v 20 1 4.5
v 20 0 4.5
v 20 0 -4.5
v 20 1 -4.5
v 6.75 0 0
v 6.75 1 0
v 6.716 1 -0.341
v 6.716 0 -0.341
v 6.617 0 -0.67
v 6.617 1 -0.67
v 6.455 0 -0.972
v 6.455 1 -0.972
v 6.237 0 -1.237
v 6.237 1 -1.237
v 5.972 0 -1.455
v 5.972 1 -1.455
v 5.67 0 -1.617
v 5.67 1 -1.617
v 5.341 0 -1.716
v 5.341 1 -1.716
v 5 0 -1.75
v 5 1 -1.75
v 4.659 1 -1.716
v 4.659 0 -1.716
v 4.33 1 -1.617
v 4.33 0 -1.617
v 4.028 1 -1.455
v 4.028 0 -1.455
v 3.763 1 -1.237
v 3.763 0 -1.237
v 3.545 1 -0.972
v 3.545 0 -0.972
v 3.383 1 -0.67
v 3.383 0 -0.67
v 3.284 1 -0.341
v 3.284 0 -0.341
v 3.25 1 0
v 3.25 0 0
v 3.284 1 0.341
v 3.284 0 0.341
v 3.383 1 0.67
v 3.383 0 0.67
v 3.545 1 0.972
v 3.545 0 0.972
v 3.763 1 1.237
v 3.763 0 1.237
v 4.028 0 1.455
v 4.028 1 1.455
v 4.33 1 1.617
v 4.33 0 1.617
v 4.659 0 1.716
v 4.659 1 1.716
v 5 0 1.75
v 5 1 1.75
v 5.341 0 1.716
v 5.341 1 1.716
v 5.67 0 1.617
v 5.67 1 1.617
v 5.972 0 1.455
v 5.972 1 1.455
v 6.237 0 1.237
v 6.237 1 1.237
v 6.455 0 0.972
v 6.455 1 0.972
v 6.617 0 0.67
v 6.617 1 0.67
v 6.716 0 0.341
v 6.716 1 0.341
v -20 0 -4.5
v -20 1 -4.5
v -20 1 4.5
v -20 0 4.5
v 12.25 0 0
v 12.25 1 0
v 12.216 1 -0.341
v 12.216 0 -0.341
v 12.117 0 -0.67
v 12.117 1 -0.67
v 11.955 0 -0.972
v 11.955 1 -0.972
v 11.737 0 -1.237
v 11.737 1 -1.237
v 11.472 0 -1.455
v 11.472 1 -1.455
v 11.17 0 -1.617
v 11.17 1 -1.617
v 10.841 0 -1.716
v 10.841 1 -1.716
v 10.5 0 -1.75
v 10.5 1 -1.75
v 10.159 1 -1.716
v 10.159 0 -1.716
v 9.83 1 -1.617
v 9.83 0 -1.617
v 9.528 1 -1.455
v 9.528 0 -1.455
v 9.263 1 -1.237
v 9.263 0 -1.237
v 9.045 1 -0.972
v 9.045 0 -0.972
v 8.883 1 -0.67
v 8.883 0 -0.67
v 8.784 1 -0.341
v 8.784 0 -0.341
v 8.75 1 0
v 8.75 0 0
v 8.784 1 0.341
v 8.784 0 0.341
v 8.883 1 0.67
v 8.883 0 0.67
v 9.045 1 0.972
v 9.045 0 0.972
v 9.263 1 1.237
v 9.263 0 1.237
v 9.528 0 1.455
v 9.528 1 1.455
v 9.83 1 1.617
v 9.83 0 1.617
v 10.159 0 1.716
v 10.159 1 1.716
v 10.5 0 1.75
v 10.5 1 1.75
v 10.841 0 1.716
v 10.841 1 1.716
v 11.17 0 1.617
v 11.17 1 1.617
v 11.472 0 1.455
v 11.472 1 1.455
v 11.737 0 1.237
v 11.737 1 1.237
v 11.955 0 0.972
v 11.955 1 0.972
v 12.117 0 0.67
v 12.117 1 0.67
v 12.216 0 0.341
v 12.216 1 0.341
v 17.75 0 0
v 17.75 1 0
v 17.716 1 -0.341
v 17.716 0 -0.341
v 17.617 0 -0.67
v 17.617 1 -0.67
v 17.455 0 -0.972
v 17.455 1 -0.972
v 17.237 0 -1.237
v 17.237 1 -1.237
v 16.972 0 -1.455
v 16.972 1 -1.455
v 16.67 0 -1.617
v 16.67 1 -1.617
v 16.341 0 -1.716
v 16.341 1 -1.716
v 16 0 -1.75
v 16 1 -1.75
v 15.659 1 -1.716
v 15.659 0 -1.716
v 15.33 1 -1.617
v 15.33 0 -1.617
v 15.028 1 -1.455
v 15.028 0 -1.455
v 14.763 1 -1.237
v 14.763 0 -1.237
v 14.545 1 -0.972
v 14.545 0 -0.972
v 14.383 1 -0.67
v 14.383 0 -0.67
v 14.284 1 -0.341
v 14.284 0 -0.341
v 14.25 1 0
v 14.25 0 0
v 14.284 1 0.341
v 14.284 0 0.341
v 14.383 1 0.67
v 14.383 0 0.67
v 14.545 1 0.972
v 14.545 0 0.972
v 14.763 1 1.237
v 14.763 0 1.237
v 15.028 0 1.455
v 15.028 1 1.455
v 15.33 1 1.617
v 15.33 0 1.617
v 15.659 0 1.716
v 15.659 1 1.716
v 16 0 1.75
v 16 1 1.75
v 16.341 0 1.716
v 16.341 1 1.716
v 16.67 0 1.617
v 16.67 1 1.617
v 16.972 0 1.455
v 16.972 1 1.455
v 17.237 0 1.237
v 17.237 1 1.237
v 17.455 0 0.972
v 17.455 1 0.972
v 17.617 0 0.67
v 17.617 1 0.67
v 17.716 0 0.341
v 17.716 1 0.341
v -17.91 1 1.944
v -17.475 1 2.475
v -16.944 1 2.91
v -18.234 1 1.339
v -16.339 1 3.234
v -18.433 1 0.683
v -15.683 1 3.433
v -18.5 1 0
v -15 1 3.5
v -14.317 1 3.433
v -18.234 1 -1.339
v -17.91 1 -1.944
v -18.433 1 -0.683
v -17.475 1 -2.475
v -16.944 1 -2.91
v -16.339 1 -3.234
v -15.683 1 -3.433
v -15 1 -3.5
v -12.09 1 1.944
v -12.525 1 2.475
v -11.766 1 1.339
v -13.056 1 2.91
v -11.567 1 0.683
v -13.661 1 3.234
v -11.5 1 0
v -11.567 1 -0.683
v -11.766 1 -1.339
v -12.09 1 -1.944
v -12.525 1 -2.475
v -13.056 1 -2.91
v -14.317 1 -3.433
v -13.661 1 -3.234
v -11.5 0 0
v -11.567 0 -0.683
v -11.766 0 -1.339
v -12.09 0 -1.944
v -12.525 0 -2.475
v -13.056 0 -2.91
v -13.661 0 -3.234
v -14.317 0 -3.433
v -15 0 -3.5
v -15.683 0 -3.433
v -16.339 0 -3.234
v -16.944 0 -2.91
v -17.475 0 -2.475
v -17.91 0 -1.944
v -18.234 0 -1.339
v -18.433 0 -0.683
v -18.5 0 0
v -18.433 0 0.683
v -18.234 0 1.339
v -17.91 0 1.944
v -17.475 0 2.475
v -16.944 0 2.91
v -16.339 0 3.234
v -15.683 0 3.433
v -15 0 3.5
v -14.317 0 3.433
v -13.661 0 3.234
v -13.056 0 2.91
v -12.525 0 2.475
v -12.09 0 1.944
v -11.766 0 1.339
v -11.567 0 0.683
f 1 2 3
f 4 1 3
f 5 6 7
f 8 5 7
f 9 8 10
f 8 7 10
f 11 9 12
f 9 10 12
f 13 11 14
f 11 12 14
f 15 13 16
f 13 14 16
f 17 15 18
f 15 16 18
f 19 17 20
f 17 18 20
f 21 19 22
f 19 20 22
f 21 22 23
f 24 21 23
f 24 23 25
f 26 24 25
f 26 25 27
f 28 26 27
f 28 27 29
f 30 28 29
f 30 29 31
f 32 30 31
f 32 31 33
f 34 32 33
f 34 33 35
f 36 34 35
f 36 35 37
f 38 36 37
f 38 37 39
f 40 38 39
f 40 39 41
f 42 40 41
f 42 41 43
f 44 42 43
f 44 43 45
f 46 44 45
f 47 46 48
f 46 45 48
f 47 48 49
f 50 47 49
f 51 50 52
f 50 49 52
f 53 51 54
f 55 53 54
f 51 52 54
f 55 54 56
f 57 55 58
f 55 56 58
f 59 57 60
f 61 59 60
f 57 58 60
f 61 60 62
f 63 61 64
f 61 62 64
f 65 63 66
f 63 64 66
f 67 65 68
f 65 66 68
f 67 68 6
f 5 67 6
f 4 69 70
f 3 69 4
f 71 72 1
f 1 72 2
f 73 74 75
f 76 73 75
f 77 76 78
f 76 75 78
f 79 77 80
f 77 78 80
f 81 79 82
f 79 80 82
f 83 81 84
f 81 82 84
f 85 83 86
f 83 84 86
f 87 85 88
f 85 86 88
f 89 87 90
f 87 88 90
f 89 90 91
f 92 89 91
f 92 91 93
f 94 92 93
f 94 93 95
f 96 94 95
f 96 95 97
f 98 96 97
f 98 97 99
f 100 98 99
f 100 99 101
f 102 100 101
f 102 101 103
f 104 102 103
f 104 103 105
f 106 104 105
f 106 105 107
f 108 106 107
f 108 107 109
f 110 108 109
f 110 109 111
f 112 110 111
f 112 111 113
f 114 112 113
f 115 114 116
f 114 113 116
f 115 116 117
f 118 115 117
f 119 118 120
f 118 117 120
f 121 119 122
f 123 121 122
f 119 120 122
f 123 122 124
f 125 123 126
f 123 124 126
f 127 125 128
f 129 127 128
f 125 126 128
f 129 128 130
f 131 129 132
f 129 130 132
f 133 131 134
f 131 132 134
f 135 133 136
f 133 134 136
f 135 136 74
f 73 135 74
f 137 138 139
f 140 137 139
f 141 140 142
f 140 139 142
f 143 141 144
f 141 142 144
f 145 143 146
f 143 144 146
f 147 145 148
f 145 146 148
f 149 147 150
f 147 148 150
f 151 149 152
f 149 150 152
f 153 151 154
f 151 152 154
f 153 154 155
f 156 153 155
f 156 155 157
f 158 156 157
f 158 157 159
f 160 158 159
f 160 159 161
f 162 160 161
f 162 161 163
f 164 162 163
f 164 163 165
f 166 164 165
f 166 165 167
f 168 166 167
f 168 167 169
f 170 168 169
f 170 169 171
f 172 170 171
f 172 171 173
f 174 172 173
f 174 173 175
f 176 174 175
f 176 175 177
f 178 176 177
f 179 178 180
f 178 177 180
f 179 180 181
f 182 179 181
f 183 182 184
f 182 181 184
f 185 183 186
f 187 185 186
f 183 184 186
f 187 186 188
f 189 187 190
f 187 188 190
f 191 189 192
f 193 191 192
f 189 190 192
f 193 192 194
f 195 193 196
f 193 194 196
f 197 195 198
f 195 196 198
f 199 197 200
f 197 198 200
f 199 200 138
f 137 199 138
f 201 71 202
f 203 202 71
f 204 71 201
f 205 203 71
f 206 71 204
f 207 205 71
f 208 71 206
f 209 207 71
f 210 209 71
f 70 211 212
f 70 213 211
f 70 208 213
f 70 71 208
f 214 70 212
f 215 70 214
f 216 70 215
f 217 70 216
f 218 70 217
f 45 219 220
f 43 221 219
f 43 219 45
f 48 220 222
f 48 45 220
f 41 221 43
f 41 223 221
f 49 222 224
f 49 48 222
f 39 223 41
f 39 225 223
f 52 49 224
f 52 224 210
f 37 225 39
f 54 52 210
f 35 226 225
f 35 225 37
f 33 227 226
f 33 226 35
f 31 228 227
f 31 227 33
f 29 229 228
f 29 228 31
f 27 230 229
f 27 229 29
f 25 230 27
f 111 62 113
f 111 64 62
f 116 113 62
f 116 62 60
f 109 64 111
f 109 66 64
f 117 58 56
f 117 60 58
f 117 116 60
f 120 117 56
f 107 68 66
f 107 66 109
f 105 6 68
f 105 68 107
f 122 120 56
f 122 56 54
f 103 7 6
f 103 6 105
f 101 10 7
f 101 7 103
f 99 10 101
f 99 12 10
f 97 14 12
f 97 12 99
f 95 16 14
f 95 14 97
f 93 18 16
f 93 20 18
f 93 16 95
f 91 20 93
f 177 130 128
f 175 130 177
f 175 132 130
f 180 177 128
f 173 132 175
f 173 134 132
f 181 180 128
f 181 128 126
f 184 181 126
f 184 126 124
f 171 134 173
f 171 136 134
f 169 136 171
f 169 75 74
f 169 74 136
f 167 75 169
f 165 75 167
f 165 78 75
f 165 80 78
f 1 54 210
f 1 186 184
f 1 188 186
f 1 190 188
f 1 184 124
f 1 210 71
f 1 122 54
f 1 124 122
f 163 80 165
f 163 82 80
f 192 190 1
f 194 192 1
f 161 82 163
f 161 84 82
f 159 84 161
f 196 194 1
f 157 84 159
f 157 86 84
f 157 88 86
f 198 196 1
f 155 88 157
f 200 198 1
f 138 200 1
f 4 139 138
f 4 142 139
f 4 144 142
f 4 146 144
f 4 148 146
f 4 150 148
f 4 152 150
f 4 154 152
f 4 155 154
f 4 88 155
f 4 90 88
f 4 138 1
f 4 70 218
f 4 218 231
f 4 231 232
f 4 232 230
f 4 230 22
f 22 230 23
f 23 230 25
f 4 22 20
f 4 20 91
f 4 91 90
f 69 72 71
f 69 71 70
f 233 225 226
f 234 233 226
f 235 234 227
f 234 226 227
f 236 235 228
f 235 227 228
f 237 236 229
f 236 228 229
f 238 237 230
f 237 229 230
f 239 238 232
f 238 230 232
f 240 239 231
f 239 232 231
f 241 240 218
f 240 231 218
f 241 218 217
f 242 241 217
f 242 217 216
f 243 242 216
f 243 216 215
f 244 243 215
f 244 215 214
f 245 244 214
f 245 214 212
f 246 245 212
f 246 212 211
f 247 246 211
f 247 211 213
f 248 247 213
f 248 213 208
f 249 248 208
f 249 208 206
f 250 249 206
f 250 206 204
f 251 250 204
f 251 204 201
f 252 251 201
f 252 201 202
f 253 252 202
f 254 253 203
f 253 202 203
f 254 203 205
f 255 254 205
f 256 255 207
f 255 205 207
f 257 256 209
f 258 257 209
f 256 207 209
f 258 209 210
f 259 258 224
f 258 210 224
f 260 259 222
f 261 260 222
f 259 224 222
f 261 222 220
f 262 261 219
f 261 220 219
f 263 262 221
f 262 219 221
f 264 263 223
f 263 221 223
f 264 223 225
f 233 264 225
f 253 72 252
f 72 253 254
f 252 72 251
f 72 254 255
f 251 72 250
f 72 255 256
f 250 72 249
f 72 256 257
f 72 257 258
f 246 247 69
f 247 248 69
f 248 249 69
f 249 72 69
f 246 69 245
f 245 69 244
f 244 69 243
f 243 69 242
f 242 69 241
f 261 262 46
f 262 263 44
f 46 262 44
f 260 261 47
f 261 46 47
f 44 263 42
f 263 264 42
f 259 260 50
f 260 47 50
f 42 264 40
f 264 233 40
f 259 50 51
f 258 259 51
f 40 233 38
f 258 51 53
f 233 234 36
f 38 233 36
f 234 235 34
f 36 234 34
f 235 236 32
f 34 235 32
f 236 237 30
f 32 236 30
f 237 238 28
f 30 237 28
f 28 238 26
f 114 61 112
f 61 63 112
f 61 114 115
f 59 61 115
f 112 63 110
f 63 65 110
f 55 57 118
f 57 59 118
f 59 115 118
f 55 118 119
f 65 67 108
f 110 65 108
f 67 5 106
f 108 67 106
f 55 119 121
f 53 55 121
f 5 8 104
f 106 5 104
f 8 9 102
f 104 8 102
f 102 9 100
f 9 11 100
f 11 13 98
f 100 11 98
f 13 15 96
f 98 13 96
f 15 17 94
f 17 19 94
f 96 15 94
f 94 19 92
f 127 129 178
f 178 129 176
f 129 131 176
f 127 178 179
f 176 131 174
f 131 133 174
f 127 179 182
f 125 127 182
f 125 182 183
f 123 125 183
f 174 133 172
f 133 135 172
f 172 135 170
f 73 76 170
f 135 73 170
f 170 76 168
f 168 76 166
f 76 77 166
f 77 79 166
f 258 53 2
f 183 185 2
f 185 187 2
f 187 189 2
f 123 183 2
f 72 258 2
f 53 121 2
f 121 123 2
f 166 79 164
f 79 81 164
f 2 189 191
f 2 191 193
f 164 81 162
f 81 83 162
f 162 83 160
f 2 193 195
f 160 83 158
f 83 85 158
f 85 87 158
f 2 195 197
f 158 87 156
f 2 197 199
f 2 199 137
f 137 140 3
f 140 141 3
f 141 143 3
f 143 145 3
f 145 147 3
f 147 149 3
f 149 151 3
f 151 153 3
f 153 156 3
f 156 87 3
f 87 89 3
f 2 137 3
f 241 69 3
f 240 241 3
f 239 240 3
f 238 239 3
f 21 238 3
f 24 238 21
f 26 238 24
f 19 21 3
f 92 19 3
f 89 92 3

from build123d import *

# Parameters (mm, degrees)
SKETCH2_W           = 40
SKETCH2_H           = 9
BOSS_EXTRUDE1_DEPTH = 1
SKETCH3_R           = 3.5
CUT_EXTRUDE1_DEPTH  = 3
SKETCH4_R           = 1.75
CUT_EXTRUDE2_DEPTH  = 3
LPATTERN1_COUNT     = 3
LPATTERN1_PITCH     = 5.5


with BuildPart() as part:
    # Sketch2 → Boss-Extrude1 (new body)
    with BuildSketch(Plane(origin=(0, 0, 0), x_dir=(1, 0, 0), z_dir=(0, 1, 0))):
        Rectangle(SKETCH2_W, SKETCH2_H)
    extrude(amount=BOSS_EXTRUDE1_DEPTH)

    # Sketch3 → Cut-Extrude1 (cut)
    with BuildSketch(Plane(origin=(0, 1, 0), x_dir=(1, 0, 0), z_dir=(0, 1, 0))):
        with Locations((-15, 0)):
            Circle(SKETCH3_R)
    extrude(amount=-CUT_EXTRUDE1_DEPTH, mode=Mode.SUBTRACT)

    # Sketch4 → Cut-Extrude2 (cut)
    with BuildSketch(Plane(origin=(0, 1, 0), x_dir=(1, 0, 0), z_dir=(0, 1, 0))):
        with Locations((5, 0)):
            Circle(SKETCH4_R)
    cut_extrude2 = extrude(amount=-CUT_EXTRUDE2_DEPTH, mode=Mode.SUBTRACT)

    # LPattern1: Cut-Extrude2 ×3
    with Locations(*[(i * LPATTERN1_PITCH, 0, 0) for i in range(1, LPATTERN1_COUNT)]):
        add(cut_extrude2, mode=Mode.SUBTRACT)


solid = part.part
